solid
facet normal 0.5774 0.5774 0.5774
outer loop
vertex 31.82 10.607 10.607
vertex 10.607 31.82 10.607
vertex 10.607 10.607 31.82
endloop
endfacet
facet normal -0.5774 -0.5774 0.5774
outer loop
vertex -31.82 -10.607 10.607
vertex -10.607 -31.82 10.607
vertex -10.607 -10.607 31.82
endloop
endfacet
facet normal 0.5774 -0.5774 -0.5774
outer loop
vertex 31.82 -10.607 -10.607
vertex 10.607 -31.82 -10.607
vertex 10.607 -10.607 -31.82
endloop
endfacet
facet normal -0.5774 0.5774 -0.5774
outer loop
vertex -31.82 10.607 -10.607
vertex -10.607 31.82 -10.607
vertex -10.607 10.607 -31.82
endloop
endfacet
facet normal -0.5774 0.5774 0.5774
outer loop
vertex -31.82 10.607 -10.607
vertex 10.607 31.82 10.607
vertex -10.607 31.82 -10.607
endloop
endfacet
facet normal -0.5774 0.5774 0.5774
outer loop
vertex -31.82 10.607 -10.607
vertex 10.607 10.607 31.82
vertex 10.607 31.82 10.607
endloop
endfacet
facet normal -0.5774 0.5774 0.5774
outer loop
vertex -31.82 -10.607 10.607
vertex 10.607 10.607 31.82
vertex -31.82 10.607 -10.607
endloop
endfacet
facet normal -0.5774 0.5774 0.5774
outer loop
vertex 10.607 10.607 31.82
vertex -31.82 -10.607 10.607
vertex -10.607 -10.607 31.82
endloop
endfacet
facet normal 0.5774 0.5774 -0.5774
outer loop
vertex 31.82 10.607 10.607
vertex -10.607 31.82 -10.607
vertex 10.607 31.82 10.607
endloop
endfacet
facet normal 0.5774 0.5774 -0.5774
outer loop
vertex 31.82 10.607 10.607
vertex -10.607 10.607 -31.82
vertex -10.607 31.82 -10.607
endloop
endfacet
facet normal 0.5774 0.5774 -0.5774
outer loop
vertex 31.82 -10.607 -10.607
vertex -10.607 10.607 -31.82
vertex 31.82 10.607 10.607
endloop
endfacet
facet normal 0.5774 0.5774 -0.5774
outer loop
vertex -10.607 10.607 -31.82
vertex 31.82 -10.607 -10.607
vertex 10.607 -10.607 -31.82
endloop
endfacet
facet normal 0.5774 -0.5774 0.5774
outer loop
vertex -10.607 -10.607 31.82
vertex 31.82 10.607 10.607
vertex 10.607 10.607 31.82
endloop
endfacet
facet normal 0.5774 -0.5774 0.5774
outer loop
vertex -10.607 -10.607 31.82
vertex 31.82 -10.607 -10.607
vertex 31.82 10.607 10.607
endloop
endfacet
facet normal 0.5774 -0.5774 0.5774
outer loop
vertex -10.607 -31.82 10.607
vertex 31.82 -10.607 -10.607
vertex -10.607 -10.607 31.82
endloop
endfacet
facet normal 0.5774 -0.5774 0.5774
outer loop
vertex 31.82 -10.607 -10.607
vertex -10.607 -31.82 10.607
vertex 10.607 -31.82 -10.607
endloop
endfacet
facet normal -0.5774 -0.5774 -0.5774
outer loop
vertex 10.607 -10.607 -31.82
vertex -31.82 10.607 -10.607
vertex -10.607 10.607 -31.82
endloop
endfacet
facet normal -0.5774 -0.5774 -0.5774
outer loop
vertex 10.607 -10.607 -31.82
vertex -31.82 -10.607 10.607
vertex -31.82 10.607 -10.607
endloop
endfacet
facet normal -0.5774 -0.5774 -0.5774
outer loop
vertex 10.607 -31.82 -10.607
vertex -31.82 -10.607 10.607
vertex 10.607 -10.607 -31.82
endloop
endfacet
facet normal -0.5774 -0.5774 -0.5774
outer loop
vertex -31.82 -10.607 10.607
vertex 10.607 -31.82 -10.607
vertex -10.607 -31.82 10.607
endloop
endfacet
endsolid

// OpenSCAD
// Truncated Tetrahedron
// (C) @oblomobka - 2023.06
// GPL license

/* **CUSTOMIZER VARIABLES** */
// Edge
edge = 30; //[10:100]
// Center of the solid or stand over a face
position = "Center"; //["Center", "Face"]

/* **MODULES** */   
module TruncatedTetrahedron(edge=20, position="Face"){ //tT -> Conway notation
    
    // Invariants
    diAngleHexHex_tT = acos(1/3);   // dihedral angle between hexagonal faces of tT  = 70.529
    diAngleTriHex_tT = acos(-1/3);  // dihedral angle between hexagonal-triangle faces of tT = 109,471
    
    // Relations
    rInsTruncatedTetrahedron = 3/sqrt(24); // radius of a inscribed sphere touching the hexagons - for edge = 1 -> radius = 0,612
    
    // Variables
    a = 3*edge/(2*sqrt(2));     // Tetrahedron points
    b = edge/sqrt(2);           // Truncate factor
    
    // Definition of points and faces V = 12 / F = 8 ( 4hexagons + 4 triangles )
    tTpoints=[
        // Every line define a triangle face in one octant
        [ +(a-b), +(a-b), +a], [ +(a-b), +a, +(a-b)], [ +a, +(a-b), +(a-b)],   // +X +Y +Z
        [ -(a-b), -(a-b), +a], [ -(a-b), -a, +(a-b)], [ -a, -(a-b), +(a-b)],   // -X -Y +Z
        [ +(a-b), -(a-b), -a], [ +(a-b), -a, -(a-b)], [ +a, -(a-b), -(a-b)],   // +X -Y -Z
        [ -(a-b), +(a-b), -a], [ -(a-b), +a, -(a-b)], [ -a, +(a-b), -(a-b)]    // -X +Y -Z              
        ];
    
    tTfaces=[
        // Triangles
        [  0,  1,  2], [  3,  4,  5], [  6,  7,  8], [  9, 10, 11],
        
        // Hexagons
        [  0,  3,  5, 11, 10,  1], [  1, 10,  9,  6,  8,  2],
        [  0,  2,  8,  7,  4,  3], [  4,  7,  6,  9, 11,  5]
        ];
 
    // Polyhedron stands on xy plane centered on the center of the face or centered on the center of polyhedron
    if ( position == "Center") {
        polyhedron ( tTpoints, tTfaces);
        }
    else if ( position == "Face"){
        translate ([ 0, 0, edge*rInsTruncatedTetrahedron]) 
            rotate ([ 90-diAngleHexHex_tT/2, 0, 0])
                rotate ([0, 0, 45])
                    polyhedron ( tTpoints, tTfaces);}
    }

/* **RENDERING OF SOLIDS** */
TruncatedTetrahedron ( edge = edge, position = position);
